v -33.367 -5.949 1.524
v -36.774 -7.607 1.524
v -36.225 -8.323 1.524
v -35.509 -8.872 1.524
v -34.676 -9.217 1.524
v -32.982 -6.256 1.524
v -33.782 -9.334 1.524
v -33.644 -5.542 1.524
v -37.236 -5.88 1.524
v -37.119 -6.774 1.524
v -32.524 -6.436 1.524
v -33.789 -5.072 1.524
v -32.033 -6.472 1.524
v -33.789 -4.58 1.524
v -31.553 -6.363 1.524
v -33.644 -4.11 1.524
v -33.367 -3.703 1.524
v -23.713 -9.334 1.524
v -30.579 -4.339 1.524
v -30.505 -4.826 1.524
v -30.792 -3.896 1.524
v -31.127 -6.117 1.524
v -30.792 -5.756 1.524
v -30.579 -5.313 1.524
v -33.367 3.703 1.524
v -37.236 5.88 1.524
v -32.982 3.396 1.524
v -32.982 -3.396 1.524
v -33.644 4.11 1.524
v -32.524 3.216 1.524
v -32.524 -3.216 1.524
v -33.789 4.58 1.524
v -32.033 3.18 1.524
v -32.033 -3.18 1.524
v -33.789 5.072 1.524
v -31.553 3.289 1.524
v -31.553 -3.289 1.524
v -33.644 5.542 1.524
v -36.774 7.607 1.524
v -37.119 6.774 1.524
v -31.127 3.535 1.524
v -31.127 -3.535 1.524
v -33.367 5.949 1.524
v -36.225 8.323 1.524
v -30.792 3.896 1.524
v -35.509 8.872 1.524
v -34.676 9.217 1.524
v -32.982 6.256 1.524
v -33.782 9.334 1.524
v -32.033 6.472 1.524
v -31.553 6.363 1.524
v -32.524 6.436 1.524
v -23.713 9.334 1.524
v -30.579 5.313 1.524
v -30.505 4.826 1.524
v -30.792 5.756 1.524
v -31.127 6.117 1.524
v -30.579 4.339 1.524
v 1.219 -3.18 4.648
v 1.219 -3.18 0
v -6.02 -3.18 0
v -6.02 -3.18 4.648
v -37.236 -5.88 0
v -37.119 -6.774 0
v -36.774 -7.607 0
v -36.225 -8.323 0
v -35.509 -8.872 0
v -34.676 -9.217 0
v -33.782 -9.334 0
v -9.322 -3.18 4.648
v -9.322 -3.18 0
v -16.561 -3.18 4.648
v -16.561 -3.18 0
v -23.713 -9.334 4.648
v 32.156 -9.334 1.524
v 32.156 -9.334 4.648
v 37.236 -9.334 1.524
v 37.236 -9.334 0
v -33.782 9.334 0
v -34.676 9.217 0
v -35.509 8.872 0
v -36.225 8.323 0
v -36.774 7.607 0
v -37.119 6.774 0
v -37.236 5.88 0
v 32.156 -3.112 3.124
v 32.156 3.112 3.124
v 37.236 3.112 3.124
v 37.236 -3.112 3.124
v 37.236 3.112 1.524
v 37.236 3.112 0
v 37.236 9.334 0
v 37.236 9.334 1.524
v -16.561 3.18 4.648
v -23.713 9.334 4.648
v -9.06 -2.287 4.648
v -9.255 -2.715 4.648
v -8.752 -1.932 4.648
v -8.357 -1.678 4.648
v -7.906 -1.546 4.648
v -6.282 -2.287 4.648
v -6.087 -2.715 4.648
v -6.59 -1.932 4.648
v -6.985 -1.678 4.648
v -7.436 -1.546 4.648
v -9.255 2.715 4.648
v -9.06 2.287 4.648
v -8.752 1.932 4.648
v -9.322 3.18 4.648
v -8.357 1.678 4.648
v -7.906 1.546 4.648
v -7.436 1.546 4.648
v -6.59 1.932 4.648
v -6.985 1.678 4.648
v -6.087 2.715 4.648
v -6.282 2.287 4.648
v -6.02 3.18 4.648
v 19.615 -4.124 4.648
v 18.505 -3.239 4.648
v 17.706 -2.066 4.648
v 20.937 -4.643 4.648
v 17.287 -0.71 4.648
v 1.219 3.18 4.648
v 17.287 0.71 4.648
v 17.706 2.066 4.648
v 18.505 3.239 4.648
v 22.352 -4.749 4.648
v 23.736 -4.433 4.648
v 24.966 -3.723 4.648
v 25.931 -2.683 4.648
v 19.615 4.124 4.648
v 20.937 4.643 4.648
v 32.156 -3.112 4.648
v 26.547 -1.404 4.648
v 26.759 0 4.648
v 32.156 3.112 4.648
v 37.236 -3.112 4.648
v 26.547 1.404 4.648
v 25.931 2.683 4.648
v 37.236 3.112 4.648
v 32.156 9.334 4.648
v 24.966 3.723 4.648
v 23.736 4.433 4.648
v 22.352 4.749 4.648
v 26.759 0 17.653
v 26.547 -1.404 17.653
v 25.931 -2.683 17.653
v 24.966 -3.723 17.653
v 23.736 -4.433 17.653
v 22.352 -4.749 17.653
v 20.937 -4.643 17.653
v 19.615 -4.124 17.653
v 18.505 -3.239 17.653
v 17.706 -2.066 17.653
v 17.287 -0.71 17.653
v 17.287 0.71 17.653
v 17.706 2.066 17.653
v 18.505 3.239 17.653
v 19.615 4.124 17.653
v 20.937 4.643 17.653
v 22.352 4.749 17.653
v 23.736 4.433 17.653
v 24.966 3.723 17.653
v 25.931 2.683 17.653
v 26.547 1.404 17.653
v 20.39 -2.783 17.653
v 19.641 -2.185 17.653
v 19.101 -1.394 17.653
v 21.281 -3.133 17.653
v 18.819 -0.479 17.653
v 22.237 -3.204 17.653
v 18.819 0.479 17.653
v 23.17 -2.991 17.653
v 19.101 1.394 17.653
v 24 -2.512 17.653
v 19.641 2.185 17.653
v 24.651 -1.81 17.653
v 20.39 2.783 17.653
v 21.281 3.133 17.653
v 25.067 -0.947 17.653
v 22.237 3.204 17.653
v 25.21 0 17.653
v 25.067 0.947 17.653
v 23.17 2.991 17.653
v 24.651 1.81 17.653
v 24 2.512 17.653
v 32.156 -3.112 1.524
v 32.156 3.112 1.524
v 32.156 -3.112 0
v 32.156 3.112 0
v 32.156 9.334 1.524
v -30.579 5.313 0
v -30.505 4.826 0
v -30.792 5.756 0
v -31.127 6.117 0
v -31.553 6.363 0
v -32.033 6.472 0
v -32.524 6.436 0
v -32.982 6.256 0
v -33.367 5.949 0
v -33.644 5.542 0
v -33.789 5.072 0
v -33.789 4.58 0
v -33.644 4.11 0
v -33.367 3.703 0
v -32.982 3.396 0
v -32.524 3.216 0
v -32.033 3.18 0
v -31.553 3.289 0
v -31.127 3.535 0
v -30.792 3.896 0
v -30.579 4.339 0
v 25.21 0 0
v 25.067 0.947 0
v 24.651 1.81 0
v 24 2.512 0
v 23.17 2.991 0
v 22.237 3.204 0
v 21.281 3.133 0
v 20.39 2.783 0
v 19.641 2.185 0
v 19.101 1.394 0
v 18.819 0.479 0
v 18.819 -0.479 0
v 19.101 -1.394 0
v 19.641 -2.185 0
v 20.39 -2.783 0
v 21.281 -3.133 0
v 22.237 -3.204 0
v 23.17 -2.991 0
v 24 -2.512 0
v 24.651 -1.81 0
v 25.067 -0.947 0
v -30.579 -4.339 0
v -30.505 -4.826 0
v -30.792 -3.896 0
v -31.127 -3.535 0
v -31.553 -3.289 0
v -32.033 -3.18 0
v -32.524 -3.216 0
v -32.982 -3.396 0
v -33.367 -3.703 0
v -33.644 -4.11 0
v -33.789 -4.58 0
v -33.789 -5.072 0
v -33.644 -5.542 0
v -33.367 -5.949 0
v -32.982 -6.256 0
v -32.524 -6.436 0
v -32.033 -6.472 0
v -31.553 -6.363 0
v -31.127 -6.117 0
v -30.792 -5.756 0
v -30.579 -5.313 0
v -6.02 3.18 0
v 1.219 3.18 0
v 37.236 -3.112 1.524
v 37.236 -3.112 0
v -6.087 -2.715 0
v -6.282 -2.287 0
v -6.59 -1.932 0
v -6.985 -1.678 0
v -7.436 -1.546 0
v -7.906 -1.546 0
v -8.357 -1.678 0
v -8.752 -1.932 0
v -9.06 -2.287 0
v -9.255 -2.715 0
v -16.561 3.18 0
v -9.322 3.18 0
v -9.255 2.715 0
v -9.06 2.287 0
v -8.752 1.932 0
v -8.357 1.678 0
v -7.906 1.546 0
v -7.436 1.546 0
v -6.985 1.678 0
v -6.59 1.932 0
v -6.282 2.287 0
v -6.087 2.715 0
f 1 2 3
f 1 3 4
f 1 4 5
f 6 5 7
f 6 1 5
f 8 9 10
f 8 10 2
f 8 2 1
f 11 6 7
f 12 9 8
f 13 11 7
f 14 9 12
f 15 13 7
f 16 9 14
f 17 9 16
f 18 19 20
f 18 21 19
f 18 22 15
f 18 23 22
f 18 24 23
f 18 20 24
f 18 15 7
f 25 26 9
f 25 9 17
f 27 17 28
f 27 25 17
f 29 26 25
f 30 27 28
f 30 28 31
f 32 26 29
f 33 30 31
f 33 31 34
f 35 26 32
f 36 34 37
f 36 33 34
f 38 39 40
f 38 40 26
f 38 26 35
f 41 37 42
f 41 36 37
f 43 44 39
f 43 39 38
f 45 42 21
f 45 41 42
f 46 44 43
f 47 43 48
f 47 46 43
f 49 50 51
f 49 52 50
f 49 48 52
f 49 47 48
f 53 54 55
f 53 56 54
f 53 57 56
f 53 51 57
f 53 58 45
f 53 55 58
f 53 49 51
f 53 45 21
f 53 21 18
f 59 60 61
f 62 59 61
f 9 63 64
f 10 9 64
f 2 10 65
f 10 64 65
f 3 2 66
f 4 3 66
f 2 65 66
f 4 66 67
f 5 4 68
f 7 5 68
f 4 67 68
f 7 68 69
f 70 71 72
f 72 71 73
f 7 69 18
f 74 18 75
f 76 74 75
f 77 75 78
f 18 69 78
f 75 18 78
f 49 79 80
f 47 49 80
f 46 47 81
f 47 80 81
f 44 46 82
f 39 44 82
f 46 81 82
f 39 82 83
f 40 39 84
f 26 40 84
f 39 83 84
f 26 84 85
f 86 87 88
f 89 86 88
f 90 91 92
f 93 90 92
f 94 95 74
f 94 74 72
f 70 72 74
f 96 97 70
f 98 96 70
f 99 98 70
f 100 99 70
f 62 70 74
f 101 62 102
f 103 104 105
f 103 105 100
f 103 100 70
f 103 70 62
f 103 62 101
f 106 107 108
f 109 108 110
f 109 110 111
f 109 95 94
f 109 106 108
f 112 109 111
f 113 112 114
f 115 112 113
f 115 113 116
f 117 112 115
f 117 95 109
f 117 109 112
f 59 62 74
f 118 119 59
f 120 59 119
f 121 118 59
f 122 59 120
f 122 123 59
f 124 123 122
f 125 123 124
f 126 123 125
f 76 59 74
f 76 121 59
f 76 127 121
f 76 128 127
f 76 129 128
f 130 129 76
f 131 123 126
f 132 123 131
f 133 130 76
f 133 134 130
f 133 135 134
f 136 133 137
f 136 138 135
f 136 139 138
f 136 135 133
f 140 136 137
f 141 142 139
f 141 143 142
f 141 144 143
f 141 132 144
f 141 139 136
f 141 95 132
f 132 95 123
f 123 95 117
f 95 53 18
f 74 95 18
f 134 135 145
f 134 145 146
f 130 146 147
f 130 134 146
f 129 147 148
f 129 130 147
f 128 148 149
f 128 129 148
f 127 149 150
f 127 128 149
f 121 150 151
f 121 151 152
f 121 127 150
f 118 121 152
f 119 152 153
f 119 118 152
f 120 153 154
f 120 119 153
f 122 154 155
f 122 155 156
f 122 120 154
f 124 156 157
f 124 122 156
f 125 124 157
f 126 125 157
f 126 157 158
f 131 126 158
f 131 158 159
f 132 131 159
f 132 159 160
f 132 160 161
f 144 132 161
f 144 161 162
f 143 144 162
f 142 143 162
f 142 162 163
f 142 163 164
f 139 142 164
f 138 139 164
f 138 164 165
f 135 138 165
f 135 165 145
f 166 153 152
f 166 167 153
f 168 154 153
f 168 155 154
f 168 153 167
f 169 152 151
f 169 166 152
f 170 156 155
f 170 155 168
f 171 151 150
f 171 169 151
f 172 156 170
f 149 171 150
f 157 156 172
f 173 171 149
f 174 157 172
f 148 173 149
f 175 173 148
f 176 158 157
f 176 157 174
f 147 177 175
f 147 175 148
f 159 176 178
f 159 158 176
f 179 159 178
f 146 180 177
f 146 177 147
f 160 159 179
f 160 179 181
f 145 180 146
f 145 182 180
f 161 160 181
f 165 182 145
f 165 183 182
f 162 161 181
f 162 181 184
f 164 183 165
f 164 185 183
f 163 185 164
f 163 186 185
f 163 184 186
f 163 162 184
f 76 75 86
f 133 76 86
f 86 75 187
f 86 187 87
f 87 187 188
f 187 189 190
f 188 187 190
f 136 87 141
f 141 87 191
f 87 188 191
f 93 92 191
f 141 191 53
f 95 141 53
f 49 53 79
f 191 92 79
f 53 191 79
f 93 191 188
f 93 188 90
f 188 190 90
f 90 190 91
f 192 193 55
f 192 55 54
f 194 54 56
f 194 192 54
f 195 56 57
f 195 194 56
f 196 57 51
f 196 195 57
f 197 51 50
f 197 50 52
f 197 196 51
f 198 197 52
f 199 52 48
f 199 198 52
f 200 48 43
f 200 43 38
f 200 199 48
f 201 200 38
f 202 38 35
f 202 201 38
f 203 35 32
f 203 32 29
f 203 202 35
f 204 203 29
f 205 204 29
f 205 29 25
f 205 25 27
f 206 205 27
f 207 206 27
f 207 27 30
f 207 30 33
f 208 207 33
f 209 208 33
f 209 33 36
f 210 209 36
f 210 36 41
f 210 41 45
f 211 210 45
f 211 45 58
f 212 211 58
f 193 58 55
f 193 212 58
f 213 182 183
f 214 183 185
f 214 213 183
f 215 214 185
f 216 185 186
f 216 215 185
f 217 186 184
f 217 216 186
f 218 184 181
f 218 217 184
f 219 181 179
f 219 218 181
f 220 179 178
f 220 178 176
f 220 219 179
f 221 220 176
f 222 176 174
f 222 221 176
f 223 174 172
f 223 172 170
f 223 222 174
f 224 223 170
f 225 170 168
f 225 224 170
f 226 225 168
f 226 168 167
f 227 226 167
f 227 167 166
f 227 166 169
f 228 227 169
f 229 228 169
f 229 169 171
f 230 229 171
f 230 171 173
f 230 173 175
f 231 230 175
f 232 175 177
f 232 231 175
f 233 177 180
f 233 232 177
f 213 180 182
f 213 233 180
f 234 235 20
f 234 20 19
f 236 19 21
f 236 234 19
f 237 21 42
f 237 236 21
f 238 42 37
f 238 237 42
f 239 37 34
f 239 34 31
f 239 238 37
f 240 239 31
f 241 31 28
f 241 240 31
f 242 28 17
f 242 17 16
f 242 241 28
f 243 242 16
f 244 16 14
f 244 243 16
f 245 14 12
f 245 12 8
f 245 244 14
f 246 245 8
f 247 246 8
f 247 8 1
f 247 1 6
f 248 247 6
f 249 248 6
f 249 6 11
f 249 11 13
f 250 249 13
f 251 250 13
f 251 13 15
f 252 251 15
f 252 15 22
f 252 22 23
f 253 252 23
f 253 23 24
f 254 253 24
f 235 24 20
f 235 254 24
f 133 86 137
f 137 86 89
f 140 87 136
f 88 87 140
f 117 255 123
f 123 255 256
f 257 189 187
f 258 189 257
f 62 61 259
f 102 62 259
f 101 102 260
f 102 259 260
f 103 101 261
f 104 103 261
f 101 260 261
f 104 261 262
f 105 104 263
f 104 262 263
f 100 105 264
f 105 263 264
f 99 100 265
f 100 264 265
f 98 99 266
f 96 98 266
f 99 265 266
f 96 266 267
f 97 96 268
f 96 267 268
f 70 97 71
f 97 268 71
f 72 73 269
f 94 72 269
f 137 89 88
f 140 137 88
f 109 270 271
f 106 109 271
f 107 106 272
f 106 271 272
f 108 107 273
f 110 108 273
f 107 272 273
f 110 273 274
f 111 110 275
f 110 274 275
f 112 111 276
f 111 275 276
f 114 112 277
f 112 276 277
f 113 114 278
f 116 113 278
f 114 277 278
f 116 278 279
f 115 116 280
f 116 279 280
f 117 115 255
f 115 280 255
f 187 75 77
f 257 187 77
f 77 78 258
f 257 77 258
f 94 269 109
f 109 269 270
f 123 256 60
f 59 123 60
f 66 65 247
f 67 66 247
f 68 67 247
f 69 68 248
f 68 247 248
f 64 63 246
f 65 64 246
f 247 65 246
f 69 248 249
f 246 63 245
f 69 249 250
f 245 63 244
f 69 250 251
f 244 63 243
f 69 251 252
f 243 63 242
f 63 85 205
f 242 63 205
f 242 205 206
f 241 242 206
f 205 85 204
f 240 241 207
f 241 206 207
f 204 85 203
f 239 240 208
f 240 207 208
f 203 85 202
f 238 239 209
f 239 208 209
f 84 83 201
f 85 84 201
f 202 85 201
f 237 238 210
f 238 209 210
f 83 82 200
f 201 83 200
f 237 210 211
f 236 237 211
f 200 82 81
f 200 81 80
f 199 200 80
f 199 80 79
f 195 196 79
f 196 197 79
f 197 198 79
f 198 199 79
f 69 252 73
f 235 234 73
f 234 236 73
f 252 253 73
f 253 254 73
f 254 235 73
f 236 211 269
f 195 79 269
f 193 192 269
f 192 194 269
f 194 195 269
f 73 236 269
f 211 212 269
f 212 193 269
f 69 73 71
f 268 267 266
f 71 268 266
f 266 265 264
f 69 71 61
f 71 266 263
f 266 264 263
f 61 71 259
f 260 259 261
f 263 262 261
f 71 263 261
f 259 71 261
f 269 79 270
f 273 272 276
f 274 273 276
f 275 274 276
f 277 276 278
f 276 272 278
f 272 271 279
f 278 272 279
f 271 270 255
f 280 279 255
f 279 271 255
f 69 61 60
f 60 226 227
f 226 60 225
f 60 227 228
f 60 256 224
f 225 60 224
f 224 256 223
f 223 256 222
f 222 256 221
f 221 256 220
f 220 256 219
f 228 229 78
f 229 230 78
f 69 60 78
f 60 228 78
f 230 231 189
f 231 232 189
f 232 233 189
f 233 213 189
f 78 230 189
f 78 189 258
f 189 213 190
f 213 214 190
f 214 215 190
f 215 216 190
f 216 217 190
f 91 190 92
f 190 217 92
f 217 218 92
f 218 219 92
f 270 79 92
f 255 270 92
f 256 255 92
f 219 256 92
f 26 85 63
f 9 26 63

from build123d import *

# Parameters (mm, degrees)
F0_R     = 1.651
F0_R_2   = 4.7625
F0_R_3   = 3.2131
F0_W     = 5.08
F0_H     = 6.223
F1_DEPTH = 1.524
F2_DEPTH = 4.6482
F3_START = 3.1242
F3_DEPTH = 1.524
F4_DEPTH = 16.129


with BuildPart() as f1:
    # F0 (on Top) → F1 (new body)
    with BuildSketch(Plane.XY):
        with BuildLine():
            Line((-23.71344, 0), (-23.71344, 9.3345))
            Line((-23.71344, 9.3345), (-33.782, 9.3345))
            ThreePointArc((-33.782, 9.3345), (-36.2246296649, 8.3227296649), (-37.2364, 5.8801))
            Line((-37.2364, 5.8801), (-37.2364, -5.8801))
            ThreePointArc((-37.2364, -5.8801), (-36.2246296649, -8.3227296649), (-33.782, -9.3345))
            Line((-33.782, -9.3345), (-23.71344, -9.3345))
            Line((-23.71344, -9.3345), (-23.71344, 0))
        make_face()
        with Locations((-32.1564, -4.826)):
            Circle(F0_R, mode=Mode.SUBTRACT)
        with Locations((-32.1564, 4.826)):
            Circle(F0_R, mode=Mode.SUBTRACT)
        Polygon((32.1564, 3.1115), (32.1564, 9.3345), (-23.71344, 9.3345), (-23.71344, 0), (-23.71344, -9.3345), (32.1564, -9.3345), (32.1564, -3.1115), align=None)
        Polygon((-9.3218, -3.18008), (-16.5608, -3.18008), (-16.5608, 3.18008), (-9.3218, 3.18008), (-7.6708, 3.18008), (-6.0198, 3.18008), (1.2192, 3.18008), (1.2192, -3.18008), (-6.0198, -3.18008), (-7.6708, -3.18008), align=None, mode=Mode.SUBTRACT)
        with Locations((21.9964, 0)):
            Circle(F0_R_2, mode=Mode.SUBTRACT)
        with Locations((21.9964, 0)):
            Circle(F0_R_2)
        with Locations((21.9964, 0)):
            Circle(F0_R_3, mode=Mode.SUBTRACT)
        with Locations((34.6964, -6.223)):
            Rectangle(F0_W, F0_H)
        with Locations((34.6964, 6.223)):
            Rectangle(F0_W, F0_H)
        with BuildLine():
            ThreePointArc((-6.0198, -3.18008), (-7.6708, -1.52908), (-9.3218, -3.18008))
            Line((-9.3218, -3.18008), (-7.6708, -3.18008))
            Line((-7.6708, -3.18008), (-6.0198, -3.18008))
        make_face()
        with BuildLine():
            Line((-7.6708, 3.18008), (-9.3218, 3.18008))
            ThreePointArc((-9.3218, 3.18008), (-7.6708, 1.52908), (-6.0198, 3.18008))
            Line((-6.0198, 3.18008), (-7.6708, 3.18008))
        make_face()
    extrude(amount=F1_DEPTH)

    # F0 (on Top) → F2 (join)
    with BuildSketch(Plane.XY):
        Polygon((32.1564, 3.1115), (32.1564, 9.3345), (-23.71344, 9.3345), (-23.71344, 0), (-23.71344, -9.3345), (32.1564, -9.3345), (32.1564, -3.1115), align=None)
        Polygon((-9.3218, -3.18008), (-16.5608, -3.18008), (-16.5608, 3.18008), (-9.3218, 3.18008), (-7.6708, 3.18008), (-6.0198, 3.18008), (1.2192, 3.18008), (1.2192, -3.18008), (-6.0198, -3.18008), (-7.6708, -3.18008), align=None, mode=Mode.SUBTRACT)
        with Locations((21.9964, 0)):
            Circle(F0_R_2, mode=Mode.SUBTRACT)
        with BuildLine():
            ThreePointArc((-6.0198, -3.18008), (-7.6708, -1.52908), (-9.3218, -3.18008))
            Line((-9.3218, -3.18008), (-7.6708, -3.18008))
            Line((-7.6708, -3.18008), (-6.0198, -3.18008))
        make_face()
        with BuildLine():
            Line((-7.6708, 3.18008), (-9.3218, 3.18008))
            ThreePointArc((-9.3218, 3.18008), (-7.6708, 1.52908), (-6.0198, 3.18008))
            Line((-6.0198, 3.18008), (-7.6708, 3.18008))
        make_face()
    extrude(amount=F2_DEPTH)

    # F0 (on Top) → F3 (join)
    with BuildSketch(Plane.XY.offset(F3_START)):
        with Locations((34.6964, 0)):
            Rectangle(F0_W, F0_H)
    extrude(amount=F3_DEPTH)

    # F4 (add): a face of the model
    f4_faces = [f1.faces().sort_by_distance(p)[0] for p in [
        (17.3686038418, 0, 1.524),
    ]]
    extrude(f4_faces, amount=F4_DEPTH)


solid = f1.part
